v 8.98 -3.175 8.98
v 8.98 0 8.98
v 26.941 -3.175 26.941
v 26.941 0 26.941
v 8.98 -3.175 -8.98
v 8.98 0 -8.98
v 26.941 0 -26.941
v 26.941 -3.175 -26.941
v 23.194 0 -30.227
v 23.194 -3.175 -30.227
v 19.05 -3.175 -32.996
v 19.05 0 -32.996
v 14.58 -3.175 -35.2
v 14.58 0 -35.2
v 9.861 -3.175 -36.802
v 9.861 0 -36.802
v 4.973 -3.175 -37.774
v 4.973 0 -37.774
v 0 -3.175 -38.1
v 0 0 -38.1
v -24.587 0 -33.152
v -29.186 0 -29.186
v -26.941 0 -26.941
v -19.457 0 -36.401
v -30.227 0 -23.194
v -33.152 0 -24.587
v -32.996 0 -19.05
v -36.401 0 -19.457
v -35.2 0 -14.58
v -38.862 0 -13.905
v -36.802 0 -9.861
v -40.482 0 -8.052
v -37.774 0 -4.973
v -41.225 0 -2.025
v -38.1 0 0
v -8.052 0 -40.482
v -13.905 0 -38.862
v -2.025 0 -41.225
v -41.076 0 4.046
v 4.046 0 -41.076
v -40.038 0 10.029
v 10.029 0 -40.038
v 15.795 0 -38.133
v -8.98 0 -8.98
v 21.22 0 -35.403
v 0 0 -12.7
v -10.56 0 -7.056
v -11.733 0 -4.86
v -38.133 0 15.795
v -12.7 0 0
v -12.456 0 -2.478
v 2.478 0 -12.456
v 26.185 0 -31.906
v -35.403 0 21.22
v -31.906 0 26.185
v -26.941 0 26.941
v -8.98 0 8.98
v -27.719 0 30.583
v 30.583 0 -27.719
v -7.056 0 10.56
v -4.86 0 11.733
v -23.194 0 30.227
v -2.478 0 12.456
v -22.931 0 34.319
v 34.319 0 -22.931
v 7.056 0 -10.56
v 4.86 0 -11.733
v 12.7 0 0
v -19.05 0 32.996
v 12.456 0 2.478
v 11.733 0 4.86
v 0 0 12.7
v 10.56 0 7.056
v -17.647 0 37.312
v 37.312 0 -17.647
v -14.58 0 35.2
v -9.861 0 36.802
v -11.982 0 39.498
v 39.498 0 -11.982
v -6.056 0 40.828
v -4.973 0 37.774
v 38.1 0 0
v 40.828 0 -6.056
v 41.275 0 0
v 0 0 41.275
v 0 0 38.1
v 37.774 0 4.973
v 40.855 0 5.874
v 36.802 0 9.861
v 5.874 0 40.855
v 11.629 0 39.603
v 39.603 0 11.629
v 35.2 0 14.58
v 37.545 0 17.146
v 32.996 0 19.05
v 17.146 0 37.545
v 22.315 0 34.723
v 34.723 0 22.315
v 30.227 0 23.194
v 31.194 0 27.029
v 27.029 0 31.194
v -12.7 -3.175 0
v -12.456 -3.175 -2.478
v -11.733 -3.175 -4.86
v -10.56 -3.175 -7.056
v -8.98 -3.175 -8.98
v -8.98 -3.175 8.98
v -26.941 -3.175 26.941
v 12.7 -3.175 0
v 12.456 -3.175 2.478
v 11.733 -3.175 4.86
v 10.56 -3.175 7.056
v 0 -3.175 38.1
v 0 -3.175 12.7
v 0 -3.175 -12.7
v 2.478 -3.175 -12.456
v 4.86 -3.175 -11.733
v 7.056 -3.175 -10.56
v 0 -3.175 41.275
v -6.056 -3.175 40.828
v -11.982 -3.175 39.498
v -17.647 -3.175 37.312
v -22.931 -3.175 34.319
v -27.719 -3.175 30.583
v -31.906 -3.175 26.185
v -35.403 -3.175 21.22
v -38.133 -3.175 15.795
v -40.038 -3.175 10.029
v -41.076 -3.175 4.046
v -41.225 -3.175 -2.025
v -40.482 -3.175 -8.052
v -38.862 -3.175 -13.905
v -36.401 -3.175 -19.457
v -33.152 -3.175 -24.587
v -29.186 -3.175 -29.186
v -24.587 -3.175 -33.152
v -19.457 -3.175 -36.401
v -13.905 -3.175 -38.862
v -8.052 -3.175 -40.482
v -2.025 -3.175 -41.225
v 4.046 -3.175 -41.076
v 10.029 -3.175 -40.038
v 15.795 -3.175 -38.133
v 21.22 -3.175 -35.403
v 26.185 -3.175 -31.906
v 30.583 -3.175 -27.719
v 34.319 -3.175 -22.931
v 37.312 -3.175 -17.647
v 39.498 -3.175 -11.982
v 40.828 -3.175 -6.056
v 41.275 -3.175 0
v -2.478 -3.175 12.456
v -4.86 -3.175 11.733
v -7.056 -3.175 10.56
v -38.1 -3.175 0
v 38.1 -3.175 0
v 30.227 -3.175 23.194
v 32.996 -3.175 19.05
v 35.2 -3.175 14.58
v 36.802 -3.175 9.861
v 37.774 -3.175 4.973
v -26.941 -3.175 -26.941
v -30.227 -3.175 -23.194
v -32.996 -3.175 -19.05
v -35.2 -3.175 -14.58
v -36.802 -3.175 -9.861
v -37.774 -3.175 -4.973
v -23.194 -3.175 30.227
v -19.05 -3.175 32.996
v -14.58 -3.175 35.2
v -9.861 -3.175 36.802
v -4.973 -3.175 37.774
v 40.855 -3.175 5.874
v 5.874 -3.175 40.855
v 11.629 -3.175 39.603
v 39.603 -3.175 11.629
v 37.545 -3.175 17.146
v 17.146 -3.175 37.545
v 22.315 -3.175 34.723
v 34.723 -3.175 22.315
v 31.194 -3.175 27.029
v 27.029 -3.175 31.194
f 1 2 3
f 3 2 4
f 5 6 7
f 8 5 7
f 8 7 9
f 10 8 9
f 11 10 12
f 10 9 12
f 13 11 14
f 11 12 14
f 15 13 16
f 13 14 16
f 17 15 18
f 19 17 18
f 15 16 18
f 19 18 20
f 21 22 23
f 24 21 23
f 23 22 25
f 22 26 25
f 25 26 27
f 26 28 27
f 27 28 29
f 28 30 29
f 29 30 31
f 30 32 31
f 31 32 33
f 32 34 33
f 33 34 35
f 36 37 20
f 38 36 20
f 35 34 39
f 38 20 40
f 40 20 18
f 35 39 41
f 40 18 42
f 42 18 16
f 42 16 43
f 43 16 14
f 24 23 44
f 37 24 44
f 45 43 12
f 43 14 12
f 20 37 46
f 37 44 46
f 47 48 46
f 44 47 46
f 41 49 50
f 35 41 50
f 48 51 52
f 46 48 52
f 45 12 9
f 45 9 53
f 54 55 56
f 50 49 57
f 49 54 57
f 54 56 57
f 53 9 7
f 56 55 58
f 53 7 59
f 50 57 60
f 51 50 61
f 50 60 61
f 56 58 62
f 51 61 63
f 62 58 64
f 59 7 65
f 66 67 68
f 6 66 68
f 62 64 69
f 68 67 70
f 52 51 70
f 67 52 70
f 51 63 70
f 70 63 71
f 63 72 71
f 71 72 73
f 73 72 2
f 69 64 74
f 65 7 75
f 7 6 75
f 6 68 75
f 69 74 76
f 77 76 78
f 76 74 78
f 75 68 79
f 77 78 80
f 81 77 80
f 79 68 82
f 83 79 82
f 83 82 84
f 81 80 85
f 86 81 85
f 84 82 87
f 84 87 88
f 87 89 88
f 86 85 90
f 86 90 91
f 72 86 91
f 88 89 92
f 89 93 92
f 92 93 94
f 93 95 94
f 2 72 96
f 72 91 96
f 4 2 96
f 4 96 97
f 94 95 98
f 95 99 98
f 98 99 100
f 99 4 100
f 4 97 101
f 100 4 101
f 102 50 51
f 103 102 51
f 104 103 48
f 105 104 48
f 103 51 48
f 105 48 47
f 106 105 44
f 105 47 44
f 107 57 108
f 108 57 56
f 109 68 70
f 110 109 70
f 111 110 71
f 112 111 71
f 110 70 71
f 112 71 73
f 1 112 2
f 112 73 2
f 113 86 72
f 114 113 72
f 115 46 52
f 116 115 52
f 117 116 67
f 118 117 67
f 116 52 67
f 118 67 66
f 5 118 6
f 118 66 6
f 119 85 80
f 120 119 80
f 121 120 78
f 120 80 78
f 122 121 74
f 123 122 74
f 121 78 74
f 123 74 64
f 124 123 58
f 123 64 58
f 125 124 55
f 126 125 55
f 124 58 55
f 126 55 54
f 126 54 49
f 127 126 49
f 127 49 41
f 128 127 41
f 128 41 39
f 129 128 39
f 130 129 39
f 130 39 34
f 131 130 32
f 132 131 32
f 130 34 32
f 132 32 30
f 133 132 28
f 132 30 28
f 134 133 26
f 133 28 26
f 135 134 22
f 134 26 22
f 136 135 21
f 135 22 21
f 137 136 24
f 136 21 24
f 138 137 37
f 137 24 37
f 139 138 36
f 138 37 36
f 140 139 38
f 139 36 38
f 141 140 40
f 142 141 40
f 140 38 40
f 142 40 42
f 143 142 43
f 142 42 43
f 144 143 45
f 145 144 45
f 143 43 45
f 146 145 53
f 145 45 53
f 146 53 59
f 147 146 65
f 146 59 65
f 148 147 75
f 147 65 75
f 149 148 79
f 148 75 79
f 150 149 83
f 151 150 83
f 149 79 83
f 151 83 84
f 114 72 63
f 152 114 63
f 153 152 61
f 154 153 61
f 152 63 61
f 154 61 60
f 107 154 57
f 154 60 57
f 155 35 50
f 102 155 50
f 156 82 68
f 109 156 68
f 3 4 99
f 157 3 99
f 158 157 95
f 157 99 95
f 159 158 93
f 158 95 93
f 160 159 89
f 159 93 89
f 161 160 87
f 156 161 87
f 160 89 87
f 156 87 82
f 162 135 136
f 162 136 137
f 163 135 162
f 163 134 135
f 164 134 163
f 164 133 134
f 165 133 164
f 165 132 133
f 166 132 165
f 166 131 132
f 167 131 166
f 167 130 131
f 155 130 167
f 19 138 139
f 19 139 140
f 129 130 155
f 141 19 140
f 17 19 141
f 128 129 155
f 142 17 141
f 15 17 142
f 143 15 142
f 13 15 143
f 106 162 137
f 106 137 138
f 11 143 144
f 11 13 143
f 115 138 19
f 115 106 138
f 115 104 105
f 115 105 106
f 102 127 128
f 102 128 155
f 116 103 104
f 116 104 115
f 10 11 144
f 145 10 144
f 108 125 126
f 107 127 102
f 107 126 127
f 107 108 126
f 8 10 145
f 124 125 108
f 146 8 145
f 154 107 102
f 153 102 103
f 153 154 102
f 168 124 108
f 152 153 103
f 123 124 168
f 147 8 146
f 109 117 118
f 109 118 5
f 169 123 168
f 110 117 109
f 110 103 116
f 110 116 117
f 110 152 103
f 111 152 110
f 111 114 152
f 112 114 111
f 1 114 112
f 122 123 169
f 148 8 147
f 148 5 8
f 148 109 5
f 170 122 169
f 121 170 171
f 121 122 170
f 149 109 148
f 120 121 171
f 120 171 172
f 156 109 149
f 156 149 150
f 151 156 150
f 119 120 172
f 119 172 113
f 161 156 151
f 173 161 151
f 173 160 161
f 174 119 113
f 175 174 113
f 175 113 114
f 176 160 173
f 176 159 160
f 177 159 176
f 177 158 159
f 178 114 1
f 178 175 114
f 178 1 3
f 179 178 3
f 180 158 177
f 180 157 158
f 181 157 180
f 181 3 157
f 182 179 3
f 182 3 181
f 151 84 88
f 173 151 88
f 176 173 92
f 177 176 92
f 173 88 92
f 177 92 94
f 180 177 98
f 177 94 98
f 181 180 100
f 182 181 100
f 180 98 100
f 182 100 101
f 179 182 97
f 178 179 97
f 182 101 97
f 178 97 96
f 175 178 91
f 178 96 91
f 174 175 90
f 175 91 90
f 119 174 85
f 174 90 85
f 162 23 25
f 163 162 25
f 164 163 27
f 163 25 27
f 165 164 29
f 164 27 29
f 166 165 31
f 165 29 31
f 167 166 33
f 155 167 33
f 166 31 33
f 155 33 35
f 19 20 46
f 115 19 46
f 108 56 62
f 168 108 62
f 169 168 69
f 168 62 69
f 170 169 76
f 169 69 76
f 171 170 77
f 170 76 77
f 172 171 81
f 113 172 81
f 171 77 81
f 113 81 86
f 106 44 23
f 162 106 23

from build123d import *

# Parameters (mm, degrees)
F0_R     = 9.525
F1_DEPTH = 3.175


with BuildPart() as f1:
    # F0 (on Front) → F1 (new body)
    with BuildSketch(Plane.XZ):
        with BuildLine():
            ThreePointArc((41.275, 0), (29.1858323935, 29.1858323935), (0, 41.275))
            ThreePointArc((0, 41.275), (-29.1858323935, -29.1858323935), (41.275, 0))
        make_face()
        with BuildLine():
            ThreePointArc((26.9407683632, 26.9407683632), (35.1998101887, 14.5802387731), (38.1, 0))
            ThreePointArc((38.1, 0), (35.1998101887, -14.5802387731), (26.9407683632, -26.9407683632))
            ThreePointArc((26.9407683632, -26.9407683632), (14.5802387731, -35.1998101887), (0, -38.1))
            ThreePointArc((0, -38.1), (-14.5802387731, -35.1998101887), (-26.9407683632, -26.9407683632))
            ThreePointArc((-26.9407683632, -26.9407683632), (-35.1998101887, -14.5802387731), (-38.1, 0))
            ThreePointArc((-38.1, 0), (-35.1998101887, 14.5802387731), (-26.9407683632, 26.9407683632))
            ThreePointArc((-26.9407683632, 26.9407683632), (-14.5802387731, 35.1998101887), (0, 38.1))
            ThreePointArc((0, 38.1), (14.5802387731, 35.1998101887), (26.9407683632, 26.9407683632))
        make_face(mode=Mode.SUBTRACT)
        with BuildLine():
            ThreePointArc((26.9407683632, -26.9407683632), (35.1998101887, -14.5802387731), (38.1, 0))
            Line((38.1, 0), (12.7, 0))
            ThreePointArc((12.7, 0), (11.7332700629, -4.860079591), (8.9802561211, -8.9802561211))
            Line((8.9802561211, -8.9802561211), (26.9407683632, -26.9407683632))
        make_face()
        with BuildLine():
            Line((8.9802561211, 8.9802561211), (26.9407683632, 26.9407683632))
            ThreePointArc((26.9407683632, 26.9407683632), (14.5802387731, 35.1998101887), (0, 38.1))
            Line((0, 38.1), (0, 12.7))
            ThreePointArc((0, 12.7), (4.860079591, 11.7332700629), (8.9802561211, 8.9802561211))
        make_face()
        with BuildLine():
            ThreePointArc((8.9802561211, -8.9802561211), (11.7332700629, -4.860079591), (12.7, 0))
            ThreePointArc((12.7, 0), (11.7332700629, 4.860079591), (8.9802561211, 8.9802561211))
            ThreePointArc((8.9802561211, 8.9802561211), (4.860079591, 11.7332700629), (0, 12.7))
            ThreePointArc((0, 12.7), (-4.860079591, 11.7332700629), (-8.9802561211, 8.9802561211))
            ThreePointArc((-8.9802561211, 8.9802561211), (-11.7332700629, 4.860079591), (-12.7, 0))
            ThreePointArc((-12.7, 0), (-11.7332700629, -4.860079591), (-8.9802561211, -8.9802561211))
            ThreePointArc((-8.9802561211, -8.9802561211), (-4.860079591, -11.7332700629), (0, -12.7))
            ThreePointArc((0, -12.7), (4.860079591, -11.7332700629), (8.9802561211, -8.9802561211))
        make_face()
        Circle(F0_R, mode=Mode.SUBTRACT)
        with BuildLine():
            ThreePointArc((-26.9407683632, -26.9407683632), (-14.5802387731, -35.1998101887), (0, -38.1))
            Line((0, -38.1), (0, -12.7))
            ThreePointArc((0, -12.7), (-4.860079591, -11.7332700629), (-8.9802561211, -8.9802561211))
            Line((-8.9802561211, -8.9802561211), (-26.9407683632, -26.9407683632))
        make_face()
        with BuildLine():
            Line((-8.9802561211, 8.9802561211), (-26.9407683632, 26.9407683632))
            ThreePointArc((-26.9407683632, 26.9407683632), (-35.1998101887, 14.5802387731), (-38.1, 0))
            Line((-38.1, 0), (-12.7, 0))
            ThreePointArc((-12.7, 0), (-11.7332700629, 4.860079591), (-8.9802561211, 8.9802561211))
        make_face()
        Circle(F0_R)
    extrude(amount=F1_DEPTH)


solid = f1.part
